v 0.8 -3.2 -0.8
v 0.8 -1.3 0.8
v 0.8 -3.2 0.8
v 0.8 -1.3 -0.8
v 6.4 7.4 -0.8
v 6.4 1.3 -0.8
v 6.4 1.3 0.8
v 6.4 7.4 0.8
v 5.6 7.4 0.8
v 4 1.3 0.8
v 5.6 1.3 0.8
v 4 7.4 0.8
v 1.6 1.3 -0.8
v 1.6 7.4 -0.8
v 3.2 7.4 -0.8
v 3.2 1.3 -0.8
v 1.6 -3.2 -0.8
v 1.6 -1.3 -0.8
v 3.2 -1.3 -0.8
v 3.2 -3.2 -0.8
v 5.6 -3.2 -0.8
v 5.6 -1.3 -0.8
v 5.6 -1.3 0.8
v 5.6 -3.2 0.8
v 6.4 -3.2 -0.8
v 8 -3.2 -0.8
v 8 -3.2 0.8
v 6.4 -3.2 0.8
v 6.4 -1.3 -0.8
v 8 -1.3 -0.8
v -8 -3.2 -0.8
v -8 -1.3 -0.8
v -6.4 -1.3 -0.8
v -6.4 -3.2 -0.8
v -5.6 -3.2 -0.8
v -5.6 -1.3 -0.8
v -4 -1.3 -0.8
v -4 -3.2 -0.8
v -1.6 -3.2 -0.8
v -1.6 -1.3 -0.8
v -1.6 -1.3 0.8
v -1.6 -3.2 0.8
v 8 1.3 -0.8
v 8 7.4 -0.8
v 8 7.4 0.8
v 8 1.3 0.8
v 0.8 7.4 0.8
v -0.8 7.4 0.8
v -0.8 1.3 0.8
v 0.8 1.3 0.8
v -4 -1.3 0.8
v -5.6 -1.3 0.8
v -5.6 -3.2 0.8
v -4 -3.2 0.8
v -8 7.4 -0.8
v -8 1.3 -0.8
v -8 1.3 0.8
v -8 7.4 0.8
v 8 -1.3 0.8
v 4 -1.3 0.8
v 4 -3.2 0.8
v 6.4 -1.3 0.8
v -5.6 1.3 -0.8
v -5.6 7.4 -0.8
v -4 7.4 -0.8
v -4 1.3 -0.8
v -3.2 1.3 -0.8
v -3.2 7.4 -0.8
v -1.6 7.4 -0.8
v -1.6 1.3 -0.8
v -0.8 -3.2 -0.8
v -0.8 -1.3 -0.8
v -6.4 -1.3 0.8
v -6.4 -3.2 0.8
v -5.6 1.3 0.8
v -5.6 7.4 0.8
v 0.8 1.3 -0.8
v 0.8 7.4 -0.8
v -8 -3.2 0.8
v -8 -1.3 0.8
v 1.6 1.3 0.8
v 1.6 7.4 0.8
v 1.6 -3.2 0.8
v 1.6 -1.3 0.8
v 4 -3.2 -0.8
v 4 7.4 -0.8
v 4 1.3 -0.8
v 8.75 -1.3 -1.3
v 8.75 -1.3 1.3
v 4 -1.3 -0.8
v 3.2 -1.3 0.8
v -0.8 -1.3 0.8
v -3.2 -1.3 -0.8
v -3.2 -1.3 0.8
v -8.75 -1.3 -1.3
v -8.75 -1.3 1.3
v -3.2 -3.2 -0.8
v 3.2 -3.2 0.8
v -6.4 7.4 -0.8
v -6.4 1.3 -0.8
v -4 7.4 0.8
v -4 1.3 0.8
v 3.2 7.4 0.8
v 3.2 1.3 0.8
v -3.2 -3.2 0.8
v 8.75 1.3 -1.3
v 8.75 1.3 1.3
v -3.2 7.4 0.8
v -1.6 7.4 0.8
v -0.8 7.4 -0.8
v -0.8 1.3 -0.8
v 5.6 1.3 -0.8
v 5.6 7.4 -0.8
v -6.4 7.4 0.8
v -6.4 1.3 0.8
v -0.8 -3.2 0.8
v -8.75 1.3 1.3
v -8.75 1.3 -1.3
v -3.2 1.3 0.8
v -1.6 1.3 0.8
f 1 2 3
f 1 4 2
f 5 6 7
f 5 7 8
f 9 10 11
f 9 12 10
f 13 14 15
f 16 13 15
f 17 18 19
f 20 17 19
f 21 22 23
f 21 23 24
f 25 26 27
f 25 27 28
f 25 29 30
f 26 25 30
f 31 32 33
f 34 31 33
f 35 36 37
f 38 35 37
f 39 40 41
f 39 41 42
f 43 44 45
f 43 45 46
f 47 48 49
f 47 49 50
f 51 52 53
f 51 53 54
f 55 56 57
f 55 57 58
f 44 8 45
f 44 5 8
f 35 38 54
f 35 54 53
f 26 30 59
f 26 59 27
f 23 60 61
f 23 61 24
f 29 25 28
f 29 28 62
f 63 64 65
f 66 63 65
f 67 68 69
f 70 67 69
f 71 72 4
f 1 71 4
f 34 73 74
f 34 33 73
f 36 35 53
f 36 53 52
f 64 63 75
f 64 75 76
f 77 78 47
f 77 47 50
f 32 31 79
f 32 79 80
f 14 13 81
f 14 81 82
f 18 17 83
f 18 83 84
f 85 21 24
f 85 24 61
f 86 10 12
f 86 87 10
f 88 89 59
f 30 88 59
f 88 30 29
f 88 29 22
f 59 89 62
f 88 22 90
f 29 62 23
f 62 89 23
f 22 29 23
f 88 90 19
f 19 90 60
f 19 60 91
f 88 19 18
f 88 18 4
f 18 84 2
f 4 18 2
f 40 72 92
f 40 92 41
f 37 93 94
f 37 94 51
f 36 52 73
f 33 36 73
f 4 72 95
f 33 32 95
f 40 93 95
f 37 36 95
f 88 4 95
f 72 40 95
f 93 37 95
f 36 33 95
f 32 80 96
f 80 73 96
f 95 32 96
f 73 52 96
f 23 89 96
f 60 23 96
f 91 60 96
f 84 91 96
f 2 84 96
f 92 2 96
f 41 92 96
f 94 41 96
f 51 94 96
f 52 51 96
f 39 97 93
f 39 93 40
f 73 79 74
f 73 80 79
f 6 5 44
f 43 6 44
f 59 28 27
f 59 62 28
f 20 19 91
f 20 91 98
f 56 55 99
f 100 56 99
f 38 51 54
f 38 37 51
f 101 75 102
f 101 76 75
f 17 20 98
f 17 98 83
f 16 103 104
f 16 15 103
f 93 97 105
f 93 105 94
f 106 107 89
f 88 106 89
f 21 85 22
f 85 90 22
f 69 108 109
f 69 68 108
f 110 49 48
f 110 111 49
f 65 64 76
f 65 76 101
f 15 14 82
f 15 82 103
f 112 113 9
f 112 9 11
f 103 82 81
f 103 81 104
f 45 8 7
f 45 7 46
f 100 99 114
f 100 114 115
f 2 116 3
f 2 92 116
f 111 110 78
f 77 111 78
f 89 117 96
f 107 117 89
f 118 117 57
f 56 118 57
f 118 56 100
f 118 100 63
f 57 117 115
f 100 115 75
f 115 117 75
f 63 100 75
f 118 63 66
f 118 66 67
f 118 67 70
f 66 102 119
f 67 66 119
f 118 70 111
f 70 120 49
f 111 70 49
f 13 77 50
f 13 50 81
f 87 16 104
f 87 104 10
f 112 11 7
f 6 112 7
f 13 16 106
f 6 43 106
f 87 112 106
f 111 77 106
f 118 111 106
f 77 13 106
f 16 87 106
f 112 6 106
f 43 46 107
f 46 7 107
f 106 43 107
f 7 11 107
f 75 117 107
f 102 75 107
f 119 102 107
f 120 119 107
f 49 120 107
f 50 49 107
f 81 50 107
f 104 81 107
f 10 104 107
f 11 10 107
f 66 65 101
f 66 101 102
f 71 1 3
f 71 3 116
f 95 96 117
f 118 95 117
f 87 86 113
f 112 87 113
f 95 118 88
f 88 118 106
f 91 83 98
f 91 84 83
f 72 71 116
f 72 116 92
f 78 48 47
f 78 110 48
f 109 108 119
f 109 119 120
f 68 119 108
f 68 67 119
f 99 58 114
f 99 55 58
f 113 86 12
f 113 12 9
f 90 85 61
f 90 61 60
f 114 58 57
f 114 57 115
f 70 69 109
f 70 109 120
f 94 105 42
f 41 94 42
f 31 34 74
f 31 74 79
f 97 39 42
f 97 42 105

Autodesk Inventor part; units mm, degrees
ref_plane "YZ Plane" through (0, 0, 0) normal (1, 0, 0) x (0, 1, 0)
ref_plane "XZ Plane" through (0, 0, 0) normal (0, 1, 0) x (-1, 0, 0)
ref_plane "XY Plane" through (0, 0, 0) normal (0, 0, 1) x (1, 0, 0)
sketch "Эскиз1" plane through (0, 0, 0) normal (0, 0, 1) x (1, 0, 0)
  line L0 (8.75, -1.3) -> (-8.75, -1.3)
  line L1 (-8.75, -1.3) -> (-8.75, 1.3)
  line L2 (-8.75, 1.3) -> (8.75, 1.3)
  line L3 (8.75, 1.3) -> (8.75, -1.3)
  line L4 (8.75, -1.3) -> (-8.75, 1.3) construction
  line L5 (-8.75, -1.3) -> (8.75, 1.3) construction
  line L6 (-8, 7.4) -> (-6.4, 7.4)
  line L7 (-6.4, 7.4) -> (-6.4, 1.3)
  line L8 (-6.4, 1.3) -> (-8, 1.3)
  line L9 (-8, 1.3) -> (-8, 7.4)
  line L10 (-8, 1.3) -> (-7.2, 1.3)
  line L11 (-6.4, -3.2) -> (-8, -3.2)
  line L12 (-6.4, -1.3) -> (-6.4, -3.2)
  line L13 (-8, -3.2) -> (-8, -1.3)
  line L14 (-4, 7.4) -> (-4, 1.3)
  line L15 (-5.6, 1.3) -> (-5.6, 7.4)
  line L16 (-5.6, 7.4) -> (-4, 7.4)
  line L17 (-5.6, -3.2) -> (-5.6, -1.3)
  line L18 (-4, -1.3) -> (-4, -3.2)
  line L19 (-4, -3.2) -> (-5.6, -3.2)
  line L20 (-1.6, 7.4) -> (-1.6, 1.3)
  line L21 (-3.2, 1.3) -> (-3.2, 7.4)
  line L22 (-3.2, 7.4) -> (-1.6, 7.4)
  line L23 (-3.2, -3.2) -> (-3.2, -1.3)
  line L24 (-1.6, -1.3) -> (-1.6, -3.2)
  line L25 (-1.6, -3.2) -> (-3.2, -3.2)
  line L26 (0.8, 7.4) -> (0.8, 1.3)
  line L27 (-0.8, 1.3) -> (-0.8, 7.4)
  line L28 (-0.8, 7.4) -> (0.8, 7.4)
  line L29 (-0.8, -3.2) -> (-0.8, -1.3)
  line L30 (0.8, -1.3) -> (0.8, -3.2)
  line L31 (0.8, -3.2) -> (-0.8, -3.2)
  line L32 (3.2, 7.4) -> (3.2, 1.3)
  line L33 (1.6, 1.3) -> (1.6, 7.4)
  line L34 (1.6, 7.4) -> (3.2, 7.4)
  line L35 (1.6, -3.2) -> (1.6, -1.3)
  line L36 (3.2, -1.3) -> (3.2, -3.2)
  line L37 (3.2, -3.2) -> (1.6, -3.2)
  line L38 (5.6, 7.4) -> (5.6, 1.3)
  line L39 (4, 1.3) -> (4, 7.4)
  line L40 (4, 7.4) -> (5.6, 7.4)
  line L41 (4, -3.2) -> (4, -1.3)
  line L42 (5.6, -1.3) -> (5.6, -3.2)
  line L43 (5.6, -3.2) -> (4, -3.2)
  line L44 (8, 7.4) -> (8, 1.3)
  line L45 (6.4, 1.3) -> (6.4, 7.4)
  line L46 (6.4, 7.4) -> (8, 7.4)
  line L47 (6.4, -3.2) -> (6.4, -1.3)
  line L48 (8, -1.3) -> (8, -3.2)
  line L49 (8, -3.2) -> (6.4, -3.2)
  point P0 (0, 0)
  point P1 (8, -1.3)
  point P2 (6.4, -1.3)
  point P3 (5.6, -1.3)
  point P4 (4, -1.3)
  point P5 (3.2, -1.3)
  point P6 (1.6, -1.3)
  point P7 (0.8, -1.3)
  point P8 (-0.8, -1.3)
  point P9 (-1.6, -1.3)
  point P10 (-3.2, -1.3)
  point P11 (-4, -1.3)
  point P12 (-5.6, -1.3)
  point P13 (-5.6, 1.3)
  point P14 (-4, 1.3)
  point P15 (-3.2, 1.3)
  point P16 (-1.6, 1.3)
  point P17 (-0.8, 1.3)
  point P18 (0.8, 1.3)
  point P19 (6.4, 1.3)
  point P20 (8, 1.3)
  point P21 (1.6, 1.3)
  point P22 (3.2, 1.3)
  point P23 (4, 1.3)
  point P24 (5.6, 1.3)
  point P25 (-6.4, 1.3)
  dimension "d0" = 17.5
  dimension "d1" = 2.6
  dimension "d3" = 8.7
  dimension "d7" = 4.5
  dimension "d8" = 0.75
  dimension "d9" = 1.6
  dimension "d12" = 2.4
extrude "Выдавливание1" add sketch "Эскиз1" against normal mid plane 2.6 contours L0 L1 L2 L3
extrude "Выдавливание2" add sketch "Эскиз1" along normal mid plane 1.6 contours L48 L49 L47 L0 | L2 L45 L46 L44 | L42 L43 L41 L0 | L2 L39 L40 L38 | L36 L37 L35 L0 | L2 L33 L34 L32 | L30 L31 L29 L0 | L2 L27 L28 L26 | L24 L25 L23 L0 | L2 L21 L22 L20 | L18 L19 L17 L0 | L2 L15 L16 L14 | L12 L11 L13 L0 | L2 L9 L6 L7
properties part number "ЛЦМК.00002.00.00.00.00.01-01"
